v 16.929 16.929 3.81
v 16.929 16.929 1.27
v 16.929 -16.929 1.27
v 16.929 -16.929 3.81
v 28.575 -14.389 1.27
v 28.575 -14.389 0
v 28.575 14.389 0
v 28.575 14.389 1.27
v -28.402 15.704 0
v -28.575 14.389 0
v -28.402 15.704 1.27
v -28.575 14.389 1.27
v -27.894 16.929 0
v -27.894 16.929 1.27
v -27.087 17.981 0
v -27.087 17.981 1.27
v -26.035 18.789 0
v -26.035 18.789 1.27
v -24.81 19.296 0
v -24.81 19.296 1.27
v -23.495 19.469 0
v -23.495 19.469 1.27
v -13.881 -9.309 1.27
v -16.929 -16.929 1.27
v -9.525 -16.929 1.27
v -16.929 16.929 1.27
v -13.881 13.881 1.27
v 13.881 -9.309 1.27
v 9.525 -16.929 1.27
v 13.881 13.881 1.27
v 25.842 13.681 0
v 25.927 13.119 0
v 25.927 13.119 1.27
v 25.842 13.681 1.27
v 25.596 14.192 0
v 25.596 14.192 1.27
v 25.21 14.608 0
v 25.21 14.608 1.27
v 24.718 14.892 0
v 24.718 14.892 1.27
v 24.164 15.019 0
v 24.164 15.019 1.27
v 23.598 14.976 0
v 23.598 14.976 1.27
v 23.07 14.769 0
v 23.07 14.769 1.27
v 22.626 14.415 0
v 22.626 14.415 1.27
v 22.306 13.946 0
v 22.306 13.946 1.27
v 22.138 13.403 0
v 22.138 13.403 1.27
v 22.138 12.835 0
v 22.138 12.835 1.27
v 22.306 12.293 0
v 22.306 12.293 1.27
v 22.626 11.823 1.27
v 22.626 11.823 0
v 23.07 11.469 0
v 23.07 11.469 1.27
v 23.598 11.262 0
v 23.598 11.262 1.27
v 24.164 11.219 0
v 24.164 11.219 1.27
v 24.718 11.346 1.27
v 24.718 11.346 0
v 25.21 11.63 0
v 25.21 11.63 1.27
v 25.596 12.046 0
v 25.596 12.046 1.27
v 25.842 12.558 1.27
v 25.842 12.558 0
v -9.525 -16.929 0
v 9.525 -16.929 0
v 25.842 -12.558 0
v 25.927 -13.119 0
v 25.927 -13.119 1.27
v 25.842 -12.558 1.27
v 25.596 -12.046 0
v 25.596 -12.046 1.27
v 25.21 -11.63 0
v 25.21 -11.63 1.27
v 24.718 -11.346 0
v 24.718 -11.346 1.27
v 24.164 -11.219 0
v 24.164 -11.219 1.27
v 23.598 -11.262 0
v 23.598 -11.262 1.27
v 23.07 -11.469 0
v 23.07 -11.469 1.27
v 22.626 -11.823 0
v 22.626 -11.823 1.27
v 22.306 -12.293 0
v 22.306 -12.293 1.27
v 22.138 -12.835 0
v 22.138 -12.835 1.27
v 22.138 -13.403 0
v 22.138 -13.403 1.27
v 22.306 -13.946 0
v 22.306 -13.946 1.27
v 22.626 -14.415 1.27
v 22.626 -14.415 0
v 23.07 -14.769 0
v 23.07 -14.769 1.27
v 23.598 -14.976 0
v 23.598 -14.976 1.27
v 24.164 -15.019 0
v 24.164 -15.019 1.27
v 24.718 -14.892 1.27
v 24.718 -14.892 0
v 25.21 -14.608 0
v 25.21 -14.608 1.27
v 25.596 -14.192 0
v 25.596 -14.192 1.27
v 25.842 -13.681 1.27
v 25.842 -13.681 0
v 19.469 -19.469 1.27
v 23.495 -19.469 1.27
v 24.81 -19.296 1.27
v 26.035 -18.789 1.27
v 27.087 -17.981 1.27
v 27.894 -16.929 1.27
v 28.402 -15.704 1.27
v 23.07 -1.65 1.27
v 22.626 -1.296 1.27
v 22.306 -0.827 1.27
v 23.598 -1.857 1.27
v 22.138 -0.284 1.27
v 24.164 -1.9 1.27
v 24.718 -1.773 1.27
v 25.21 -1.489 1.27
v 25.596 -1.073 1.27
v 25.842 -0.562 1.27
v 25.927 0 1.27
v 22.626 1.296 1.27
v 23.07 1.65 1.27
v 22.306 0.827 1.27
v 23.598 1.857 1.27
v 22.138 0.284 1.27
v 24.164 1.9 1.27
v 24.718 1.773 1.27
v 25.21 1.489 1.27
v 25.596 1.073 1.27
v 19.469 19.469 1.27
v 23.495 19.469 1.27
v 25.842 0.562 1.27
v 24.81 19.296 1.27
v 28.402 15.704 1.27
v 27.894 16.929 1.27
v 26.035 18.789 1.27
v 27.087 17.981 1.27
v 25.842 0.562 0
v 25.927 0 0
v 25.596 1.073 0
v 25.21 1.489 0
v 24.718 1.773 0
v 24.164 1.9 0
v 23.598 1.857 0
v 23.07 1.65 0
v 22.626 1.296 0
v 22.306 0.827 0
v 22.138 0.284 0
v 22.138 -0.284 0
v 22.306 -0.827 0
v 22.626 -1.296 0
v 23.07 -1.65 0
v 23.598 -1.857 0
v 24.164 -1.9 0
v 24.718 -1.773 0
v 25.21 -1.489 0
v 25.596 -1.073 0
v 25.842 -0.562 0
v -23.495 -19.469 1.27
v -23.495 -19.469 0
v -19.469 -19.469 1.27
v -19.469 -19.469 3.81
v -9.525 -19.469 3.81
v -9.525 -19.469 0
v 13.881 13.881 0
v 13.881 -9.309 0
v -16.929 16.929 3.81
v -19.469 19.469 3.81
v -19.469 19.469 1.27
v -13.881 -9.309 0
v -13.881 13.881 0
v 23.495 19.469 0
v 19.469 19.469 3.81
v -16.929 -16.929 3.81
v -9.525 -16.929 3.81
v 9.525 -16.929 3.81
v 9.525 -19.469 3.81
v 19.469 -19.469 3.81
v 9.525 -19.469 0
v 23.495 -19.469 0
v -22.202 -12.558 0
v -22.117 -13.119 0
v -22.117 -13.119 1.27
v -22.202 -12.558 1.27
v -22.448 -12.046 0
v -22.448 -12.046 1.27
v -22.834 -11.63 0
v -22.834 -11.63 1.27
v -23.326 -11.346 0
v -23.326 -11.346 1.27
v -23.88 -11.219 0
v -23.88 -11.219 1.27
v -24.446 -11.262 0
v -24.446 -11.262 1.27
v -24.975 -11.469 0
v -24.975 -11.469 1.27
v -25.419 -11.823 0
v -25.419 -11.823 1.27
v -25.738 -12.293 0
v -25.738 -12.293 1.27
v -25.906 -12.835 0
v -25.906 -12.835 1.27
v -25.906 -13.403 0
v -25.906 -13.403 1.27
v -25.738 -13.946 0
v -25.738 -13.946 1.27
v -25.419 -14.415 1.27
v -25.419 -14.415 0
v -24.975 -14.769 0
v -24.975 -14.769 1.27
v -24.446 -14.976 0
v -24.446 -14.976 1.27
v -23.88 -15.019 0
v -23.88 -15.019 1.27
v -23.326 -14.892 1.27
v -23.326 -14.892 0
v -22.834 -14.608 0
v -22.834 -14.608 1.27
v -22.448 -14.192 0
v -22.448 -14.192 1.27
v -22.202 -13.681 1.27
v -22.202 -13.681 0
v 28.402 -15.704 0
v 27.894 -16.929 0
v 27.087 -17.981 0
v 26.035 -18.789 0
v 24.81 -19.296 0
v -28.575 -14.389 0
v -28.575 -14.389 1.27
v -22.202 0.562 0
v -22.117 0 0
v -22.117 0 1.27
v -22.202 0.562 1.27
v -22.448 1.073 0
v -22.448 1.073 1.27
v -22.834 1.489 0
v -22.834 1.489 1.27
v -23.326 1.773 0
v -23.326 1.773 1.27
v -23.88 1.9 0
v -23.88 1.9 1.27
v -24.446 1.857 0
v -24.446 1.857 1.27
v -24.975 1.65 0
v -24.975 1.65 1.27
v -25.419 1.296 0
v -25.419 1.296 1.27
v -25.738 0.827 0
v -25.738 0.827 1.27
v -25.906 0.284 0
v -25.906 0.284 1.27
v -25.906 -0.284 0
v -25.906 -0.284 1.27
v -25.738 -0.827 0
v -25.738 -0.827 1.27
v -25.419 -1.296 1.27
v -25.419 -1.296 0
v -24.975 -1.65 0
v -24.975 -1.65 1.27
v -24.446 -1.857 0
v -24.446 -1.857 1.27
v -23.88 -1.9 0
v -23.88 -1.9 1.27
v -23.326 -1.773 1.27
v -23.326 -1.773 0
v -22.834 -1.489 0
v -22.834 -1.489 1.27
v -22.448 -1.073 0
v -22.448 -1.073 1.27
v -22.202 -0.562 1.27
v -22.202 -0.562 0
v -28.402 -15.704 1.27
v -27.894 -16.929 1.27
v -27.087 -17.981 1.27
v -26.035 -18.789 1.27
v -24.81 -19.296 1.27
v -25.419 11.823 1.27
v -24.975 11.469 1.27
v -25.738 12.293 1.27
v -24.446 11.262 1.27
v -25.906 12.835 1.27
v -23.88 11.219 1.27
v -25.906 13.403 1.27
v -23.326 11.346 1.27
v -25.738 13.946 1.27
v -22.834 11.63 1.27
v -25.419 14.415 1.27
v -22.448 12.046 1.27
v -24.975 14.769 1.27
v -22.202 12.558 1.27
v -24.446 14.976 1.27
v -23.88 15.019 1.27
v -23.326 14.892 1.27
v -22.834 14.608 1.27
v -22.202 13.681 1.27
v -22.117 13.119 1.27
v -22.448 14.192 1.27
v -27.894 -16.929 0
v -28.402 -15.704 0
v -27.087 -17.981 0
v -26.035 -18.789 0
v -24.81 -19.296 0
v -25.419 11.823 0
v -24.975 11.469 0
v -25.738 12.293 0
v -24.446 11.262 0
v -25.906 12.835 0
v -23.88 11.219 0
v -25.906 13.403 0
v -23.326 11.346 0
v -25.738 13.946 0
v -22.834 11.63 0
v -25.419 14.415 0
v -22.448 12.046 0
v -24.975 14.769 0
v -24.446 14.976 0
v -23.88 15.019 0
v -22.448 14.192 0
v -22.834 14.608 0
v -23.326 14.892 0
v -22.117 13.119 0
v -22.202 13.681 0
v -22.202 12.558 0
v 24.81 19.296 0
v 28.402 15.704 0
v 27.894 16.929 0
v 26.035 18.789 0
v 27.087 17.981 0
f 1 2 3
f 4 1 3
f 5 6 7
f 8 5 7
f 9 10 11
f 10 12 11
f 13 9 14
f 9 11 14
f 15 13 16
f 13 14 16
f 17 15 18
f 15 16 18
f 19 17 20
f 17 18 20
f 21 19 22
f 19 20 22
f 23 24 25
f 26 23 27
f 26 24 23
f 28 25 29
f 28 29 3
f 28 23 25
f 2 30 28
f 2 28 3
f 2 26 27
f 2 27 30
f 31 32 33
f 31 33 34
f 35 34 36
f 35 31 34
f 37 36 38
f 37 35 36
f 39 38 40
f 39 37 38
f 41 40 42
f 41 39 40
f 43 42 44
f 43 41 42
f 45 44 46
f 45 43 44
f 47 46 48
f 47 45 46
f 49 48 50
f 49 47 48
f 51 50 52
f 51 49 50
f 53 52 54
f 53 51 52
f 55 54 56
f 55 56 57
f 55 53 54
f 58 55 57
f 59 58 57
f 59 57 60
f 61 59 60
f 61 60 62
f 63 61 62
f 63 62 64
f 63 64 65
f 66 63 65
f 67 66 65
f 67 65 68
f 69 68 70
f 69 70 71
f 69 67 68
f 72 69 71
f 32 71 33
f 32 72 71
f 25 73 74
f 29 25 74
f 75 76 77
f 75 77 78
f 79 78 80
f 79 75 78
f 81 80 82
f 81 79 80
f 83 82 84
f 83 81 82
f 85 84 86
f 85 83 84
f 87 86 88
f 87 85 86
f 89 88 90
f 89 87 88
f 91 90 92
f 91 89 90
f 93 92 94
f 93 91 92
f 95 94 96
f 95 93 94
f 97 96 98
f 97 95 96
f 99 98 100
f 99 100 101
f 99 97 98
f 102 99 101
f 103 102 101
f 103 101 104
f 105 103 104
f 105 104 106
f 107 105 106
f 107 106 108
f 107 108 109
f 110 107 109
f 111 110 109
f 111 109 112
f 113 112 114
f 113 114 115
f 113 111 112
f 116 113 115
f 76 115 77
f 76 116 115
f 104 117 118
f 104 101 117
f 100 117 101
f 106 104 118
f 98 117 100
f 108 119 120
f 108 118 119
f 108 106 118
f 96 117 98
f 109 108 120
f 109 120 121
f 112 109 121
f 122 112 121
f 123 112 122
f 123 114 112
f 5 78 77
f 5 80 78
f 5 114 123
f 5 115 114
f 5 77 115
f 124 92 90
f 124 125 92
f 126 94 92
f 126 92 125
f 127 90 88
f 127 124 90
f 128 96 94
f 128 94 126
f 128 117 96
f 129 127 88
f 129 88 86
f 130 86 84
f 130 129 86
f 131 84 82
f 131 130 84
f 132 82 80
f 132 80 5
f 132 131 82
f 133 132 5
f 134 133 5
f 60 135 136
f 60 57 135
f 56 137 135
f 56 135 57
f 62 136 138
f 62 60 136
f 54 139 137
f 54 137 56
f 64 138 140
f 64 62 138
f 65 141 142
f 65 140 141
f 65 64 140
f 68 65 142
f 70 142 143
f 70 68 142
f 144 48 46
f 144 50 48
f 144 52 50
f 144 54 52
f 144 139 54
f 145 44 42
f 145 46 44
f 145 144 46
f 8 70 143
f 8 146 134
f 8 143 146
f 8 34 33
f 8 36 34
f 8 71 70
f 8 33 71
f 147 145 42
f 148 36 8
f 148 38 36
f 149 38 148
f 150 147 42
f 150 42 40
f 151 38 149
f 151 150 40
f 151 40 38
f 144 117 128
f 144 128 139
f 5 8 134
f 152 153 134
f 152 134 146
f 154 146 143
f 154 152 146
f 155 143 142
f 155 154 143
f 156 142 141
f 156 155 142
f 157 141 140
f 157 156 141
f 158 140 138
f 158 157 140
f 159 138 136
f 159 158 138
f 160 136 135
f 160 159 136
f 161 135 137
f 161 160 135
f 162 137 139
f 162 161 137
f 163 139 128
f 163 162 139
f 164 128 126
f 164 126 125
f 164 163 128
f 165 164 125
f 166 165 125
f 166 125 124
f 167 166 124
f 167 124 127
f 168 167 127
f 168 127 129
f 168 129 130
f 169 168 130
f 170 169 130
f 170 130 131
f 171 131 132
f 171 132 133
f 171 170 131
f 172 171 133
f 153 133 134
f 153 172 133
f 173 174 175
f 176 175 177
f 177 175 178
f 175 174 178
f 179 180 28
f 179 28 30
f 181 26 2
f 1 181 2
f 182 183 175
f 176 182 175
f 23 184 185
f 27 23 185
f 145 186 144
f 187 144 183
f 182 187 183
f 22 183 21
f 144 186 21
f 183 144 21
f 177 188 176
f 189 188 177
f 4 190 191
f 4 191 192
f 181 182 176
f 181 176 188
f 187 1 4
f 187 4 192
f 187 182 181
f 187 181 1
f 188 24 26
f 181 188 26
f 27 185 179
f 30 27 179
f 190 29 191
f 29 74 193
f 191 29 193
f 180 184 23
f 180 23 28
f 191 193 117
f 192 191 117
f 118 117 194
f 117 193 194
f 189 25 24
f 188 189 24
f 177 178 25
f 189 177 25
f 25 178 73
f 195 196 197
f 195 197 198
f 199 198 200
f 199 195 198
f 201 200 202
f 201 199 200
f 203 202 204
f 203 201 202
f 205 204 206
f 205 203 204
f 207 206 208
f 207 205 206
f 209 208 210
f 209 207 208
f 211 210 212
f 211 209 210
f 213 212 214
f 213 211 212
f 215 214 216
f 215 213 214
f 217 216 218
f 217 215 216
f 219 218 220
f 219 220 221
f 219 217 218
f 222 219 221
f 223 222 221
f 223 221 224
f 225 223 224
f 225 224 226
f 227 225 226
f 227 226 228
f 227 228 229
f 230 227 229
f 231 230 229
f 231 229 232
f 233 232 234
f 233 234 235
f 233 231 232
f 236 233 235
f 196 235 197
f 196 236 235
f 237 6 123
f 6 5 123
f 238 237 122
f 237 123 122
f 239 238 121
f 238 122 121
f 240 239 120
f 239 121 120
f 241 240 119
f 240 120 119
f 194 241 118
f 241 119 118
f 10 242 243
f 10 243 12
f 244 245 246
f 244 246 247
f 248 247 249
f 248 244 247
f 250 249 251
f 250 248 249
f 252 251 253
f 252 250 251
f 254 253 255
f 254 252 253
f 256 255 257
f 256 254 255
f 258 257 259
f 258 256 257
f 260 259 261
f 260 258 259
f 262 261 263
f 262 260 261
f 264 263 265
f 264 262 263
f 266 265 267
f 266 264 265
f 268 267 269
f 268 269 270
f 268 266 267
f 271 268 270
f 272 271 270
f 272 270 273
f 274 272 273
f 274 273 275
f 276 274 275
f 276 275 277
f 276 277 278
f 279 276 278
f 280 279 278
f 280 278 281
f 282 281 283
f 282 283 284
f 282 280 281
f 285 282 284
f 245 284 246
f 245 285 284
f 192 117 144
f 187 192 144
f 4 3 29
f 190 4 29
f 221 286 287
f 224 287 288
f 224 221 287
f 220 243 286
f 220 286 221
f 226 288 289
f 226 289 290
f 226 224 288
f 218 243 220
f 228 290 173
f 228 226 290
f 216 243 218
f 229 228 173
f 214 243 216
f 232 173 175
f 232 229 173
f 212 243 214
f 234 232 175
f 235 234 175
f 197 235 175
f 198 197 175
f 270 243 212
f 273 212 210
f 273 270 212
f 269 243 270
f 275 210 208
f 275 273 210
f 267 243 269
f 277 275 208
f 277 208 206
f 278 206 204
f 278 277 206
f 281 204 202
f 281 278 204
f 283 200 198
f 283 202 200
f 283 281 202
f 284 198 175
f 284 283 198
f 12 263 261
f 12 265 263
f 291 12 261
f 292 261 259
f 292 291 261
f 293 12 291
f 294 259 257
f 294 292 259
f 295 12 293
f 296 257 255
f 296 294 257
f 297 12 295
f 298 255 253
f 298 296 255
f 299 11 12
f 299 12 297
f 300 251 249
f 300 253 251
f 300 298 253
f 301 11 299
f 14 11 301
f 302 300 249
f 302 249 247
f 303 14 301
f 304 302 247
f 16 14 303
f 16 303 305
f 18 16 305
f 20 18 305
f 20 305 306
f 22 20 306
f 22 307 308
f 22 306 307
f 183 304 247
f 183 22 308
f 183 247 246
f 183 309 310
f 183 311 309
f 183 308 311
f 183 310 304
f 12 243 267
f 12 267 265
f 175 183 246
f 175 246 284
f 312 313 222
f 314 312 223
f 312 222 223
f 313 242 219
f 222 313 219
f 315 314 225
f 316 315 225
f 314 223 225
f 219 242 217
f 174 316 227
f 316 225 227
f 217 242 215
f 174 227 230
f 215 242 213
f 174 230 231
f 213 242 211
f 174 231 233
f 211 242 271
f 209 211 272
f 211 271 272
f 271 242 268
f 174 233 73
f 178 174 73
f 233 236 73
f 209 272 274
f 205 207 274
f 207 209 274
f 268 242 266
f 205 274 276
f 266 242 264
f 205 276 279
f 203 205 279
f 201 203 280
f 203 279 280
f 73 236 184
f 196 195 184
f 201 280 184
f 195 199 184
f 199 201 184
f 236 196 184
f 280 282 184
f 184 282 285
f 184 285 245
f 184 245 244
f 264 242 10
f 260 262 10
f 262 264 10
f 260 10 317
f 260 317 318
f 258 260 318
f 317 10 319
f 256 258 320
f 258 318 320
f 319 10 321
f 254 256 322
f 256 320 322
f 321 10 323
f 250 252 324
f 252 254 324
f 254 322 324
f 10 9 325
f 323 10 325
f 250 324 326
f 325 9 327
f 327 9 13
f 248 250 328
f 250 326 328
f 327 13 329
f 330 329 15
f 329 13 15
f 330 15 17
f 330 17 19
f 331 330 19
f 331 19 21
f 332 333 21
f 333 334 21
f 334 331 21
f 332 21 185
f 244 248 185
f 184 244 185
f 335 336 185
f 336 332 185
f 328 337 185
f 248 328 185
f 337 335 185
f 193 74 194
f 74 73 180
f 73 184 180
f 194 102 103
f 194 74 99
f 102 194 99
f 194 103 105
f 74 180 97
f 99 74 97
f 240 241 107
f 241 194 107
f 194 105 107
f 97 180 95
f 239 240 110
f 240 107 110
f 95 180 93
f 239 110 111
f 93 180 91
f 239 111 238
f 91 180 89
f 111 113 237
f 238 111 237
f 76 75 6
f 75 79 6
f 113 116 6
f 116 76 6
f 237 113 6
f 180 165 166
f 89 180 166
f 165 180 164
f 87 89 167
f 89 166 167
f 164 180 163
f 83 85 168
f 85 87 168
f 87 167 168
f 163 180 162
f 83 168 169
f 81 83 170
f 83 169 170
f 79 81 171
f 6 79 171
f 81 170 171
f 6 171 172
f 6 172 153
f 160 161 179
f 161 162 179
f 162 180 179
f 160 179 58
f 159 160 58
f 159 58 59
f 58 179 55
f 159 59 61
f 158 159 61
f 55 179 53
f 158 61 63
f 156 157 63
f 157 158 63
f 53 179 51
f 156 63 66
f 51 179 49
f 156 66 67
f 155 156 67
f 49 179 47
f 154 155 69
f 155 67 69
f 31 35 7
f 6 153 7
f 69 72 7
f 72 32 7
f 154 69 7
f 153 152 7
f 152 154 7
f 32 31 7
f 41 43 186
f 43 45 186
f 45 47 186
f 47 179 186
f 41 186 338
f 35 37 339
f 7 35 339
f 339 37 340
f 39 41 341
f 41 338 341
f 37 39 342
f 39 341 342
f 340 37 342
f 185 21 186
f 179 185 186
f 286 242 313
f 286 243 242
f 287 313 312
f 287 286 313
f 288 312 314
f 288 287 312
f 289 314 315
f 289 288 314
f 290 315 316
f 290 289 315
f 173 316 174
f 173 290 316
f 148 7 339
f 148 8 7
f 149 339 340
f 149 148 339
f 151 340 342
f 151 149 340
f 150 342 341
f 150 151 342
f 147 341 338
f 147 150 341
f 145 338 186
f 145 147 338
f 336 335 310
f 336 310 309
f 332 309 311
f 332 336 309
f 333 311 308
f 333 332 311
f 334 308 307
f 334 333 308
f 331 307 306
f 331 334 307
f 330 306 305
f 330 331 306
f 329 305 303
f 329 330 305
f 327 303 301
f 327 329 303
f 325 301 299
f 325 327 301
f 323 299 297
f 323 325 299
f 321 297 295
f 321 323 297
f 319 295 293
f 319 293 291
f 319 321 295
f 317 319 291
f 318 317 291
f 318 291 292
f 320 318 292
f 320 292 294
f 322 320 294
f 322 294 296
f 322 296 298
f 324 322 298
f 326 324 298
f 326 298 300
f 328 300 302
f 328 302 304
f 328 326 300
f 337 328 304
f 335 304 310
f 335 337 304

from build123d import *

# Parameters (mm, degrees)
F0_W     = 27.7622
F0_H     = 23.1902
F1_DEPTH = 1.27
F2_DEPTH = 3.81
F0_W_2   = 9.1059
F0_H_2   = 38.9382
F0_R     = 1.905
F3_DEPTH = 1.27
F4_R     = 5.08


with BuildPart() as f1:
    # F0 (on Top) → F1 (new body)
    with BuildSketch(Plane.XY):
        Polygon((16.9291, -16.9291), (16.9291, 16.9291), (-16.9291, 16.9291), (-16.9291, -16.9291), (-9.525, -16.9291), (9.525, -16.9291), align=None)
        with Locations((0, 2.286)):
            Rectangle(F0_W, F0_H, mode=Mode.SUBTRACT)
    extrude(amount=F1_DEPTH)

    # F0 (on Top) → F2 (join)
    with BuildSketch(Plane.XY):
        Polygon((-16.9291, 16.9291), (16.9291, 16.9291), (16.9291, -16.9291), (9.525, -16.9291), (9.525, -19.4691), (19.4691, -19.4691), (19.4691, 19.4691), (-19.4691, 19.4691), (-19.4691, -19.4691), (-9.525, -19.4691), (-9.525, -16.9291), (-16.9291, -16.9291), align=None)
    extrude(amount=F2_DEPTH)

    # F0 (on Top) → F3 (join)
    with BuildSketch(Plane.XY):
        with Locations((-24.02205, 0)):
            Rectangle(F0_W_2, F0_H_2)
        with Locations((-24.02205, -13.1191)):
            Circle(F0_R, mode=Mode.SUBTRACT)
        with Locations((-24.02205, 0)):
            Circle(F0_R, mode=Mode.SUBTRACT)
        with Locations((-24.02205, 13.1191)):
            Circle(F0_R, mode=Mode.SUBTRACT)
        with Locations((24.02205, 0)):
            Rectangle(F0_W_2, F0_H_2)
        with Locations((24.02205, -13.1191)):
            Circle(F0_R, mode=Mode.SUBTRACT)
        with Locations((24.02205, 0)):
            Circle(F0_R, mode=Mode.SUBTRACT)
        with Locations((24.02205, 13.1191)):
            Circle(F0_R, mode=Mode.SUBTRACT)
        Polygon((-16.9291, 16.9291), (16.9291, 16.9291), (16.9291, -16.9291), (9.525, -16.9291), (9.525, -19.4691), (19.4691, -19.4691), (19.4691, 19.4691), (-19.4691, 19.4691), (-19.4691, -19.4691), (-9.525, -19.4691), (-9.525, -16.9291), (-16.9291, -16.9291), align=None)
        Polygon((16.9291, -16.9291), (16.9291, 16.9291), (-16.9291, 16.9291), (-16.9291, -16.9291), (-9.525, -16.9291), (9.525, -16.9291), align=None)
        with Locations((0, 2.286)):
            Rectangle(F0_W, F0_H, mode=Mode.SUBTRACT)
    extrude(amount=F3_DEPTH)

    # F4
    f4_edges = [f1.edges().sort_by_distance(p)[0] for p in [
        (-28.575, 19.4691, 0.635),
        (-28.575, -19.4691, 0.635),
        (28.575, 19.4691, 0.635),
        (28.575, -19.4691, 0.635),
    ]]
    fillet(f4_edges, radius=F4_R)


solid = f1.part
